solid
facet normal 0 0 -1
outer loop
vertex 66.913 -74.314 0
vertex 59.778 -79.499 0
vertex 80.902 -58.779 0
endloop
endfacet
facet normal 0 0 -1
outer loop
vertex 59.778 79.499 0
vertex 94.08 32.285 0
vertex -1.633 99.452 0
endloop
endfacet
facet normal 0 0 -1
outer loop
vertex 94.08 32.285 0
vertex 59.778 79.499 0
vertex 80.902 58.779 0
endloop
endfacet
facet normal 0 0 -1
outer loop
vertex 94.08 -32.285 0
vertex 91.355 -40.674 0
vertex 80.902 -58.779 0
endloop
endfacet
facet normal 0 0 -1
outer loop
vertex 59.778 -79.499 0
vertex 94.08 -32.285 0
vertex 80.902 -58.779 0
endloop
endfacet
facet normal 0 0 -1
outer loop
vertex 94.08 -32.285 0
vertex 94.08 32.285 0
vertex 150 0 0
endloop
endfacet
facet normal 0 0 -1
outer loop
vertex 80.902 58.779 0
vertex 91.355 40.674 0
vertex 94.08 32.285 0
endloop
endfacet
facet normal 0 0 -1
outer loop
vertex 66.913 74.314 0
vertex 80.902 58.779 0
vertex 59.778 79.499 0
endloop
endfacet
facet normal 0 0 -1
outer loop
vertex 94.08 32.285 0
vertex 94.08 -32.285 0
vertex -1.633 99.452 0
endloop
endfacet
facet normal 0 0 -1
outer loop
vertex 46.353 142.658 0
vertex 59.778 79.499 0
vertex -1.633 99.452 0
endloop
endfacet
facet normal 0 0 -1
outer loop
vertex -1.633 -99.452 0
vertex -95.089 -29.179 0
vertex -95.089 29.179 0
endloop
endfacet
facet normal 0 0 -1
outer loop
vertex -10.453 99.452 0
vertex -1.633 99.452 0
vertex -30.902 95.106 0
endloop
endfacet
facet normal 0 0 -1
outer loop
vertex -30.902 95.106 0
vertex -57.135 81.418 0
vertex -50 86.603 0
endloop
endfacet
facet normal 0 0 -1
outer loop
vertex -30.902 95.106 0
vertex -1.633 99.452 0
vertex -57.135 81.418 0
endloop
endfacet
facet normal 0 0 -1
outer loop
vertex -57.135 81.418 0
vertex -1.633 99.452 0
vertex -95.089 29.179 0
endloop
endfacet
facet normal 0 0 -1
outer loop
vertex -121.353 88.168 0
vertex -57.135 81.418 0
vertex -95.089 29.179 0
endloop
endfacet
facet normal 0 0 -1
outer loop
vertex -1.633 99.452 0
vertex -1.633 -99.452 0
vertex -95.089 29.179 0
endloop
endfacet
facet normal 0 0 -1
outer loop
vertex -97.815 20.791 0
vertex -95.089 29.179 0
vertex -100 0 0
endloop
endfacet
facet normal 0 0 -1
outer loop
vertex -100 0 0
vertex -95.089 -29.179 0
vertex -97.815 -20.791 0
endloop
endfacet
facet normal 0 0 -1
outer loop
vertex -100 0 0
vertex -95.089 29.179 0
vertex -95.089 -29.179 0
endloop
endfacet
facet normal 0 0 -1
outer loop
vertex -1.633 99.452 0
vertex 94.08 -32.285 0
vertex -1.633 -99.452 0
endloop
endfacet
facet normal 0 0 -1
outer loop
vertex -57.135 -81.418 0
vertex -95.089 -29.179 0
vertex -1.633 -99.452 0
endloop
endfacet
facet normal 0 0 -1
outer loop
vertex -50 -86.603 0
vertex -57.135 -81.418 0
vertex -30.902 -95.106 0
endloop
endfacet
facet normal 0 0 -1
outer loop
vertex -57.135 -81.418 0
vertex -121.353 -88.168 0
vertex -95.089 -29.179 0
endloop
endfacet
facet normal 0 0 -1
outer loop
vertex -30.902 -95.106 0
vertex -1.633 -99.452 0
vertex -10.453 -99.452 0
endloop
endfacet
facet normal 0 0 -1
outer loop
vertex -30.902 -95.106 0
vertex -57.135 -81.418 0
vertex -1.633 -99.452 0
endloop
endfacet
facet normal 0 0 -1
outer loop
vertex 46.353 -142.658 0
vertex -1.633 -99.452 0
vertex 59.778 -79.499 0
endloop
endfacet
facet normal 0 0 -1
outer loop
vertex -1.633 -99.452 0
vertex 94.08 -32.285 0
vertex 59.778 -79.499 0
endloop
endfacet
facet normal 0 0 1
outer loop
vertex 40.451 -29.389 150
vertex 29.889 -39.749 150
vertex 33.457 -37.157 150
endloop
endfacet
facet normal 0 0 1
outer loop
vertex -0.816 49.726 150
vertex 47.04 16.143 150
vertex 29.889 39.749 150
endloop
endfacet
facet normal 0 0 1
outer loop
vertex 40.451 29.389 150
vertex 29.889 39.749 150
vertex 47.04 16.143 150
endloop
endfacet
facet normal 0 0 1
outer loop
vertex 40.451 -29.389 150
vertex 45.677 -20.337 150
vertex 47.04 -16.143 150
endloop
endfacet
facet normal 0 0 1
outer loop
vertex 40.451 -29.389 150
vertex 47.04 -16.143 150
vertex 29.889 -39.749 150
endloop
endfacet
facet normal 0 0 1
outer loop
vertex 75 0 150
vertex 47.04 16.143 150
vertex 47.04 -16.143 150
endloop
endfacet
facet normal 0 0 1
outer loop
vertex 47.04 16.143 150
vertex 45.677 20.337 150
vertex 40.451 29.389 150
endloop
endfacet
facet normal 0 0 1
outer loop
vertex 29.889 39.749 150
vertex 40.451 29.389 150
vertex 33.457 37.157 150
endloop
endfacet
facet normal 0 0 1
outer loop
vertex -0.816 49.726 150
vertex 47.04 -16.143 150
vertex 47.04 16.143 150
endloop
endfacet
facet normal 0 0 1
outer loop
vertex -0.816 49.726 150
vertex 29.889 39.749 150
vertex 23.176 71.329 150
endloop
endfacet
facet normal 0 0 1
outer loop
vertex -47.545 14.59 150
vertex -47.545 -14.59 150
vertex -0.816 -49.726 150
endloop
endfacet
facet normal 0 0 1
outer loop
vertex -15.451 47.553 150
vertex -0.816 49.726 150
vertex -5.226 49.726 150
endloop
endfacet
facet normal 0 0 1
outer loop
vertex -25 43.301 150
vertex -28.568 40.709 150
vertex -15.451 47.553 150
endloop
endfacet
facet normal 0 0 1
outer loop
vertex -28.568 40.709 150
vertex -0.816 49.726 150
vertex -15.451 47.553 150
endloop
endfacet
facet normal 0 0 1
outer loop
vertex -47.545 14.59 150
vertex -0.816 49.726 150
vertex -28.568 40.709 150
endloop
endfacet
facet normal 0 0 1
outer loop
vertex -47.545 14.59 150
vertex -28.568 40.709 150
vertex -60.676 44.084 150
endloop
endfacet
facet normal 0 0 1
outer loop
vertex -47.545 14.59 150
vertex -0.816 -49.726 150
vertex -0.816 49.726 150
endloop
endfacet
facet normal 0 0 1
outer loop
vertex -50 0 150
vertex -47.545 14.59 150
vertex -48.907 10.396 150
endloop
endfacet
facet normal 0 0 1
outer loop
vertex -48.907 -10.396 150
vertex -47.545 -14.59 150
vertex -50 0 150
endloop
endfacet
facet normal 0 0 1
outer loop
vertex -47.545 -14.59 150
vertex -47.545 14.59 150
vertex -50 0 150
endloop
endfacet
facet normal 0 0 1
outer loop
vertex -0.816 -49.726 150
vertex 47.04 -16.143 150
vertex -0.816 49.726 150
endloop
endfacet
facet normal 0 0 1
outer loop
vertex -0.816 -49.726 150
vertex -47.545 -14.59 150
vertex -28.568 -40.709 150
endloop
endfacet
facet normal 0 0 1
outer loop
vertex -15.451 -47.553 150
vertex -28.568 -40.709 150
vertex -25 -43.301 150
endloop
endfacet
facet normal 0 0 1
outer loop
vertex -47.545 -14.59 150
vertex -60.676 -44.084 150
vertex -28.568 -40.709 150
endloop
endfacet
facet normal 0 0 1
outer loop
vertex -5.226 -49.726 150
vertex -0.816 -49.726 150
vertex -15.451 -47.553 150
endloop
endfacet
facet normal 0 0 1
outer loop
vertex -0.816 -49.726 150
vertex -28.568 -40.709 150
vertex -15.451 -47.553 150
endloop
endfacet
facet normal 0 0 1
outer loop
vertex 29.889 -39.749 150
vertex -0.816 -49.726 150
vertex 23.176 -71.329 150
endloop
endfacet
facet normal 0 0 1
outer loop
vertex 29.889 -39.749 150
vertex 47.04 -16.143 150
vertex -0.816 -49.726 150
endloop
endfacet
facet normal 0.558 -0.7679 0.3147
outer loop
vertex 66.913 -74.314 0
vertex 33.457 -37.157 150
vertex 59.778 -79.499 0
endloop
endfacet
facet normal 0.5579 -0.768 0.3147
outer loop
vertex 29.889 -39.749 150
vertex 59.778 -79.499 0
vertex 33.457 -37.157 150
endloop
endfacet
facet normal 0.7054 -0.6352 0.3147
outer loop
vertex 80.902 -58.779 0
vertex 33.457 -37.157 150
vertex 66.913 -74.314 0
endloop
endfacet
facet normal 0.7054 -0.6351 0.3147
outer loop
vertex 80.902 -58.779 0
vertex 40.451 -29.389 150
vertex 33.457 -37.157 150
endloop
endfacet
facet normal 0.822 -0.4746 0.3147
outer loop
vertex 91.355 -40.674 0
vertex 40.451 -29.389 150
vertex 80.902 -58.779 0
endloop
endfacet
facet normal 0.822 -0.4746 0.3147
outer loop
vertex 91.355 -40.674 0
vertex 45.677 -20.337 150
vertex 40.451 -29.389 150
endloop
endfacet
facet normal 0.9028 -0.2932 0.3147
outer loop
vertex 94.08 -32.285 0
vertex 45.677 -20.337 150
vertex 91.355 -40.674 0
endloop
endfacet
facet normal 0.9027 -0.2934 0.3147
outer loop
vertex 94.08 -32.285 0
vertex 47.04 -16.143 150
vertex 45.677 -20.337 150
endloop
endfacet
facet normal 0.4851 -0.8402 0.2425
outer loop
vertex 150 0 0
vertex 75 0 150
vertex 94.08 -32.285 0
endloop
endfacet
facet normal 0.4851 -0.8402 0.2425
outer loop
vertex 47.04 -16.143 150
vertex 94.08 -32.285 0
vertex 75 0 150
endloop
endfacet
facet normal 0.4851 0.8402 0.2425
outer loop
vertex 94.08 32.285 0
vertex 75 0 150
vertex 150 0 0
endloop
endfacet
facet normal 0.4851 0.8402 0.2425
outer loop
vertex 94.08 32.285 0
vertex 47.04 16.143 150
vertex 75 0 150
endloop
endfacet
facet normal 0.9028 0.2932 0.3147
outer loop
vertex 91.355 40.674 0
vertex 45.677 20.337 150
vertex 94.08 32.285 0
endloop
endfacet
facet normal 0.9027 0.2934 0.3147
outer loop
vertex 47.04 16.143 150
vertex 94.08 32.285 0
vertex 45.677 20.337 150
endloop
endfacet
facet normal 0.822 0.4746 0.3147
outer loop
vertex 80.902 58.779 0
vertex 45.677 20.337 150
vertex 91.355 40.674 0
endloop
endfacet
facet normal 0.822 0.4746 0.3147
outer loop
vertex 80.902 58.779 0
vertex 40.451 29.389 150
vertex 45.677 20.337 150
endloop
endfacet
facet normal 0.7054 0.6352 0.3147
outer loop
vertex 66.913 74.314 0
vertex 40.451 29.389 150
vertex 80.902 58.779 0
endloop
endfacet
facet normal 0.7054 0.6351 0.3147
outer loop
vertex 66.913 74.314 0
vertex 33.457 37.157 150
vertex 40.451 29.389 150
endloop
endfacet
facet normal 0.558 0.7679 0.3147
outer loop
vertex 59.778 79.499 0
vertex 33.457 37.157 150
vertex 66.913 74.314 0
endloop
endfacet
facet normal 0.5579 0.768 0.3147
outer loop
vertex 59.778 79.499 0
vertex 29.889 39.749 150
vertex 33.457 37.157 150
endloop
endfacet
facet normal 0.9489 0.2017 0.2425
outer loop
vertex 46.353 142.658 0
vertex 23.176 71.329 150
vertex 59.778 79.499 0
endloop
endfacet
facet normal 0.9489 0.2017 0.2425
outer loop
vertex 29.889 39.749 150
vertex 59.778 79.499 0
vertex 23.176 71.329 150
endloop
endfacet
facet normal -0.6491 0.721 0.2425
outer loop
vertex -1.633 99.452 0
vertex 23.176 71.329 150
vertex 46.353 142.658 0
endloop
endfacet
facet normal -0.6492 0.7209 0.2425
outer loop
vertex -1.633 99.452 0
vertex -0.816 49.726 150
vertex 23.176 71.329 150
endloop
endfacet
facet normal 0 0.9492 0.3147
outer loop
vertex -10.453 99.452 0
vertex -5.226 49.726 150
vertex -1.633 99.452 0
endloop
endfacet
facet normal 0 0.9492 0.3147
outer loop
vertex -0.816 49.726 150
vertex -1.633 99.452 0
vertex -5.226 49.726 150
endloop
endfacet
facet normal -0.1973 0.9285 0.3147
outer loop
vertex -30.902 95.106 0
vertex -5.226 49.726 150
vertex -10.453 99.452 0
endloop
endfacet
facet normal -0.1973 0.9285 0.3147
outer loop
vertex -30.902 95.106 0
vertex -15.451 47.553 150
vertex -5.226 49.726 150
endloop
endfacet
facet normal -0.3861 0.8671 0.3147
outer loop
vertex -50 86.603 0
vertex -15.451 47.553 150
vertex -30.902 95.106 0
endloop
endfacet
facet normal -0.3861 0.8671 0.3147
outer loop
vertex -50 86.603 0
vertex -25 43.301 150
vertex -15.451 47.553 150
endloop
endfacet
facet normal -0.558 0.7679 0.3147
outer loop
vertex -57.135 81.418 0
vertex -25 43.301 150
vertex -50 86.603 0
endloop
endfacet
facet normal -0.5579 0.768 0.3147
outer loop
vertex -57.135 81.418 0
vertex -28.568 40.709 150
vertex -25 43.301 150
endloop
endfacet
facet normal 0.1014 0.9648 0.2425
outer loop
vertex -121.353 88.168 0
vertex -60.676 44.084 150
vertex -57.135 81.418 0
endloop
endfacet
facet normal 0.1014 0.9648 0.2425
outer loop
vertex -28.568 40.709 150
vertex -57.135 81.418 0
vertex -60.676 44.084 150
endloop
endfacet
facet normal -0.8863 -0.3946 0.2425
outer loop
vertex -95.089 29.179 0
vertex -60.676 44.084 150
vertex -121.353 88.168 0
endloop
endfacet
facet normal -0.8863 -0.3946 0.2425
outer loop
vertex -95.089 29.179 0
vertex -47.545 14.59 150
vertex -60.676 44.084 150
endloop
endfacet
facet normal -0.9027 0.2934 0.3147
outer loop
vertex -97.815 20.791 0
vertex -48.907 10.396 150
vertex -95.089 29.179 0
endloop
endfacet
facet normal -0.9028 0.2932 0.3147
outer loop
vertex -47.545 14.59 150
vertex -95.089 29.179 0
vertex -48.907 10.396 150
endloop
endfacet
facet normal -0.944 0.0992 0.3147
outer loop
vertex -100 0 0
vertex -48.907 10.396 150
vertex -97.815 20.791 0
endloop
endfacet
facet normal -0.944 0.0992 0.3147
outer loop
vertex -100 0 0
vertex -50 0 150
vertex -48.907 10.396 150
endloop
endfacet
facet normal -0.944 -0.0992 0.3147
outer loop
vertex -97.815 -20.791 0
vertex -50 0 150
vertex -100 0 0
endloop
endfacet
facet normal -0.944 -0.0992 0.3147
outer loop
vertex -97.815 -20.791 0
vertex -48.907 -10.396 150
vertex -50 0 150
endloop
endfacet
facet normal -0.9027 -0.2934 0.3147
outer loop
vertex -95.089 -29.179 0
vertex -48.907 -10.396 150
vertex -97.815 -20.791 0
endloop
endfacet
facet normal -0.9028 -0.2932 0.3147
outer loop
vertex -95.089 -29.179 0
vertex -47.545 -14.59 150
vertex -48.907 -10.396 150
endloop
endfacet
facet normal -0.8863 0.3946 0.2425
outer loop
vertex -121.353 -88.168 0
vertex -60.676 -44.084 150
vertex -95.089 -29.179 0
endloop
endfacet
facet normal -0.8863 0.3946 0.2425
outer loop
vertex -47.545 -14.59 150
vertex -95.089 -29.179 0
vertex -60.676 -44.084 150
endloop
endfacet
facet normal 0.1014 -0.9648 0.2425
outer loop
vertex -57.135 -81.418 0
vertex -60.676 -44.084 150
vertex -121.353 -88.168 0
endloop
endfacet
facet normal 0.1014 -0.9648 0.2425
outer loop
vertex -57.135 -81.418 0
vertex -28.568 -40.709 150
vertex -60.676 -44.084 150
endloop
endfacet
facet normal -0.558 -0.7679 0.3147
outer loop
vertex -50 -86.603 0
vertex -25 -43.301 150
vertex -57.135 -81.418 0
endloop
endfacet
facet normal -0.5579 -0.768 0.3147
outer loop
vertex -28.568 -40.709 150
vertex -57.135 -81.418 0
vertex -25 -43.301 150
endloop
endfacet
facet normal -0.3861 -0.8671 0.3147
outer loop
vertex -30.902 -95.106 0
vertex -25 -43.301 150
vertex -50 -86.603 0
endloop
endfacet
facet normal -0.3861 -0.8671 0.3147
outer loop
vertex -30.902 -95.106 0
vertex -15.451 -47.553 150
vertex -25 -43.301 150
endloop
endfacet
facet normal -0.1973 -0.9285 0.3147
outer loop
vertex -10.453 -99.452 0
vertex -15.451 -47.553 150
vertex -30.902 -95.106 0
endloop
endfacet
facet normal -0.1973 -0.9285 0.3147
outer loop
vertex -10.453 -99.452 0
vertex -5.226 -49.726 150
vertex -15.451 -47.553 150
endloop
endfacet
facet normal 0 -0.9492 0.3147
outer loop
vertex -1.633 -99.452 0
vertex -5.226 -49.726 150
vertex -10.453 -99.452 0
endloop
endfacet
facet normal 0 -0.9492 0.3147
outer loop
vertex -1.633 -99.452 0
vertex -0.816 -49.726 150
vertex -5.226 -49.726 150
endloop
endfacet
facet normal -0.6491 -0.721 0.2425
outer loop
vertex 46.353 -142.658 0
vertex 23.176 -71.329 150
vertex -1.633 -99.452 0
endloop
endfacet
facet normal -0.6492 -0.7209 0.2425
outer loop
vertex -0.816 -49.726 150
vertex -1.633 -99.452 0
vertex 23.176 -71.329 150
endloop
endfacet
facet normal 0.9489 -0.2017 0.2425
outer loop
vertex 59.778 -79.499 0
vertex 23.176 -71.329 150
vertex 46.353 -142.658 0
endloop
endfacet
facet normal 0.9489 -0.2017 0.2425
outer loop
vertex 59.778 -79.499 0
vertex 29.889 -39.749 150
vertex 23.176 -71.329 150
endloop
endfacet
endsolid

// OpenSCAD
size = 20;
cubesize = 3 * size;
cutsphere = 2 * size;
innersphere = size;
cylinderheight = 4 * size;
cylinderradius = size;
cylinderoffset = 2 * size;
radius = 100; 

linear_extrude(height=radius*(6/4), scale=0.5) {
    circle(r=radius);
    
    for (deg=[0:360/5:360]) {
        rotate([0,0,deg]) {
            translate([100, 0, 0]) {
                circle(r=radius/2, $fn=3);
            }
        }
    } 
}

//create a cyan rectangle @y+35
// translate([0, cubesize, 0])
// color([0, 1, 1])
// cube([2, 3, 4]);
// 
// // create a red rectangle at x+35
// translate([cubesize, 0, 0]) {
//     color([1,0,0])
//     cube([2, 3, 4]);
// }
// 
// // create a green 30x30x30 cube at the center with a r20 sphere cut out
// difference() {
//     color([0,1,0])
//     cube(cubesize, center=true);
//     sphere(cutsphere);
// }
// 
// // create a h40 r10 cylinder at z+30
// translate([0, 0, cylinderoffset]) {
//     cylinder(h=cylinderheight, r=cylinderradius);
// }
// 
// // create a r10 sphere at the center
// sphere(innersphere);
